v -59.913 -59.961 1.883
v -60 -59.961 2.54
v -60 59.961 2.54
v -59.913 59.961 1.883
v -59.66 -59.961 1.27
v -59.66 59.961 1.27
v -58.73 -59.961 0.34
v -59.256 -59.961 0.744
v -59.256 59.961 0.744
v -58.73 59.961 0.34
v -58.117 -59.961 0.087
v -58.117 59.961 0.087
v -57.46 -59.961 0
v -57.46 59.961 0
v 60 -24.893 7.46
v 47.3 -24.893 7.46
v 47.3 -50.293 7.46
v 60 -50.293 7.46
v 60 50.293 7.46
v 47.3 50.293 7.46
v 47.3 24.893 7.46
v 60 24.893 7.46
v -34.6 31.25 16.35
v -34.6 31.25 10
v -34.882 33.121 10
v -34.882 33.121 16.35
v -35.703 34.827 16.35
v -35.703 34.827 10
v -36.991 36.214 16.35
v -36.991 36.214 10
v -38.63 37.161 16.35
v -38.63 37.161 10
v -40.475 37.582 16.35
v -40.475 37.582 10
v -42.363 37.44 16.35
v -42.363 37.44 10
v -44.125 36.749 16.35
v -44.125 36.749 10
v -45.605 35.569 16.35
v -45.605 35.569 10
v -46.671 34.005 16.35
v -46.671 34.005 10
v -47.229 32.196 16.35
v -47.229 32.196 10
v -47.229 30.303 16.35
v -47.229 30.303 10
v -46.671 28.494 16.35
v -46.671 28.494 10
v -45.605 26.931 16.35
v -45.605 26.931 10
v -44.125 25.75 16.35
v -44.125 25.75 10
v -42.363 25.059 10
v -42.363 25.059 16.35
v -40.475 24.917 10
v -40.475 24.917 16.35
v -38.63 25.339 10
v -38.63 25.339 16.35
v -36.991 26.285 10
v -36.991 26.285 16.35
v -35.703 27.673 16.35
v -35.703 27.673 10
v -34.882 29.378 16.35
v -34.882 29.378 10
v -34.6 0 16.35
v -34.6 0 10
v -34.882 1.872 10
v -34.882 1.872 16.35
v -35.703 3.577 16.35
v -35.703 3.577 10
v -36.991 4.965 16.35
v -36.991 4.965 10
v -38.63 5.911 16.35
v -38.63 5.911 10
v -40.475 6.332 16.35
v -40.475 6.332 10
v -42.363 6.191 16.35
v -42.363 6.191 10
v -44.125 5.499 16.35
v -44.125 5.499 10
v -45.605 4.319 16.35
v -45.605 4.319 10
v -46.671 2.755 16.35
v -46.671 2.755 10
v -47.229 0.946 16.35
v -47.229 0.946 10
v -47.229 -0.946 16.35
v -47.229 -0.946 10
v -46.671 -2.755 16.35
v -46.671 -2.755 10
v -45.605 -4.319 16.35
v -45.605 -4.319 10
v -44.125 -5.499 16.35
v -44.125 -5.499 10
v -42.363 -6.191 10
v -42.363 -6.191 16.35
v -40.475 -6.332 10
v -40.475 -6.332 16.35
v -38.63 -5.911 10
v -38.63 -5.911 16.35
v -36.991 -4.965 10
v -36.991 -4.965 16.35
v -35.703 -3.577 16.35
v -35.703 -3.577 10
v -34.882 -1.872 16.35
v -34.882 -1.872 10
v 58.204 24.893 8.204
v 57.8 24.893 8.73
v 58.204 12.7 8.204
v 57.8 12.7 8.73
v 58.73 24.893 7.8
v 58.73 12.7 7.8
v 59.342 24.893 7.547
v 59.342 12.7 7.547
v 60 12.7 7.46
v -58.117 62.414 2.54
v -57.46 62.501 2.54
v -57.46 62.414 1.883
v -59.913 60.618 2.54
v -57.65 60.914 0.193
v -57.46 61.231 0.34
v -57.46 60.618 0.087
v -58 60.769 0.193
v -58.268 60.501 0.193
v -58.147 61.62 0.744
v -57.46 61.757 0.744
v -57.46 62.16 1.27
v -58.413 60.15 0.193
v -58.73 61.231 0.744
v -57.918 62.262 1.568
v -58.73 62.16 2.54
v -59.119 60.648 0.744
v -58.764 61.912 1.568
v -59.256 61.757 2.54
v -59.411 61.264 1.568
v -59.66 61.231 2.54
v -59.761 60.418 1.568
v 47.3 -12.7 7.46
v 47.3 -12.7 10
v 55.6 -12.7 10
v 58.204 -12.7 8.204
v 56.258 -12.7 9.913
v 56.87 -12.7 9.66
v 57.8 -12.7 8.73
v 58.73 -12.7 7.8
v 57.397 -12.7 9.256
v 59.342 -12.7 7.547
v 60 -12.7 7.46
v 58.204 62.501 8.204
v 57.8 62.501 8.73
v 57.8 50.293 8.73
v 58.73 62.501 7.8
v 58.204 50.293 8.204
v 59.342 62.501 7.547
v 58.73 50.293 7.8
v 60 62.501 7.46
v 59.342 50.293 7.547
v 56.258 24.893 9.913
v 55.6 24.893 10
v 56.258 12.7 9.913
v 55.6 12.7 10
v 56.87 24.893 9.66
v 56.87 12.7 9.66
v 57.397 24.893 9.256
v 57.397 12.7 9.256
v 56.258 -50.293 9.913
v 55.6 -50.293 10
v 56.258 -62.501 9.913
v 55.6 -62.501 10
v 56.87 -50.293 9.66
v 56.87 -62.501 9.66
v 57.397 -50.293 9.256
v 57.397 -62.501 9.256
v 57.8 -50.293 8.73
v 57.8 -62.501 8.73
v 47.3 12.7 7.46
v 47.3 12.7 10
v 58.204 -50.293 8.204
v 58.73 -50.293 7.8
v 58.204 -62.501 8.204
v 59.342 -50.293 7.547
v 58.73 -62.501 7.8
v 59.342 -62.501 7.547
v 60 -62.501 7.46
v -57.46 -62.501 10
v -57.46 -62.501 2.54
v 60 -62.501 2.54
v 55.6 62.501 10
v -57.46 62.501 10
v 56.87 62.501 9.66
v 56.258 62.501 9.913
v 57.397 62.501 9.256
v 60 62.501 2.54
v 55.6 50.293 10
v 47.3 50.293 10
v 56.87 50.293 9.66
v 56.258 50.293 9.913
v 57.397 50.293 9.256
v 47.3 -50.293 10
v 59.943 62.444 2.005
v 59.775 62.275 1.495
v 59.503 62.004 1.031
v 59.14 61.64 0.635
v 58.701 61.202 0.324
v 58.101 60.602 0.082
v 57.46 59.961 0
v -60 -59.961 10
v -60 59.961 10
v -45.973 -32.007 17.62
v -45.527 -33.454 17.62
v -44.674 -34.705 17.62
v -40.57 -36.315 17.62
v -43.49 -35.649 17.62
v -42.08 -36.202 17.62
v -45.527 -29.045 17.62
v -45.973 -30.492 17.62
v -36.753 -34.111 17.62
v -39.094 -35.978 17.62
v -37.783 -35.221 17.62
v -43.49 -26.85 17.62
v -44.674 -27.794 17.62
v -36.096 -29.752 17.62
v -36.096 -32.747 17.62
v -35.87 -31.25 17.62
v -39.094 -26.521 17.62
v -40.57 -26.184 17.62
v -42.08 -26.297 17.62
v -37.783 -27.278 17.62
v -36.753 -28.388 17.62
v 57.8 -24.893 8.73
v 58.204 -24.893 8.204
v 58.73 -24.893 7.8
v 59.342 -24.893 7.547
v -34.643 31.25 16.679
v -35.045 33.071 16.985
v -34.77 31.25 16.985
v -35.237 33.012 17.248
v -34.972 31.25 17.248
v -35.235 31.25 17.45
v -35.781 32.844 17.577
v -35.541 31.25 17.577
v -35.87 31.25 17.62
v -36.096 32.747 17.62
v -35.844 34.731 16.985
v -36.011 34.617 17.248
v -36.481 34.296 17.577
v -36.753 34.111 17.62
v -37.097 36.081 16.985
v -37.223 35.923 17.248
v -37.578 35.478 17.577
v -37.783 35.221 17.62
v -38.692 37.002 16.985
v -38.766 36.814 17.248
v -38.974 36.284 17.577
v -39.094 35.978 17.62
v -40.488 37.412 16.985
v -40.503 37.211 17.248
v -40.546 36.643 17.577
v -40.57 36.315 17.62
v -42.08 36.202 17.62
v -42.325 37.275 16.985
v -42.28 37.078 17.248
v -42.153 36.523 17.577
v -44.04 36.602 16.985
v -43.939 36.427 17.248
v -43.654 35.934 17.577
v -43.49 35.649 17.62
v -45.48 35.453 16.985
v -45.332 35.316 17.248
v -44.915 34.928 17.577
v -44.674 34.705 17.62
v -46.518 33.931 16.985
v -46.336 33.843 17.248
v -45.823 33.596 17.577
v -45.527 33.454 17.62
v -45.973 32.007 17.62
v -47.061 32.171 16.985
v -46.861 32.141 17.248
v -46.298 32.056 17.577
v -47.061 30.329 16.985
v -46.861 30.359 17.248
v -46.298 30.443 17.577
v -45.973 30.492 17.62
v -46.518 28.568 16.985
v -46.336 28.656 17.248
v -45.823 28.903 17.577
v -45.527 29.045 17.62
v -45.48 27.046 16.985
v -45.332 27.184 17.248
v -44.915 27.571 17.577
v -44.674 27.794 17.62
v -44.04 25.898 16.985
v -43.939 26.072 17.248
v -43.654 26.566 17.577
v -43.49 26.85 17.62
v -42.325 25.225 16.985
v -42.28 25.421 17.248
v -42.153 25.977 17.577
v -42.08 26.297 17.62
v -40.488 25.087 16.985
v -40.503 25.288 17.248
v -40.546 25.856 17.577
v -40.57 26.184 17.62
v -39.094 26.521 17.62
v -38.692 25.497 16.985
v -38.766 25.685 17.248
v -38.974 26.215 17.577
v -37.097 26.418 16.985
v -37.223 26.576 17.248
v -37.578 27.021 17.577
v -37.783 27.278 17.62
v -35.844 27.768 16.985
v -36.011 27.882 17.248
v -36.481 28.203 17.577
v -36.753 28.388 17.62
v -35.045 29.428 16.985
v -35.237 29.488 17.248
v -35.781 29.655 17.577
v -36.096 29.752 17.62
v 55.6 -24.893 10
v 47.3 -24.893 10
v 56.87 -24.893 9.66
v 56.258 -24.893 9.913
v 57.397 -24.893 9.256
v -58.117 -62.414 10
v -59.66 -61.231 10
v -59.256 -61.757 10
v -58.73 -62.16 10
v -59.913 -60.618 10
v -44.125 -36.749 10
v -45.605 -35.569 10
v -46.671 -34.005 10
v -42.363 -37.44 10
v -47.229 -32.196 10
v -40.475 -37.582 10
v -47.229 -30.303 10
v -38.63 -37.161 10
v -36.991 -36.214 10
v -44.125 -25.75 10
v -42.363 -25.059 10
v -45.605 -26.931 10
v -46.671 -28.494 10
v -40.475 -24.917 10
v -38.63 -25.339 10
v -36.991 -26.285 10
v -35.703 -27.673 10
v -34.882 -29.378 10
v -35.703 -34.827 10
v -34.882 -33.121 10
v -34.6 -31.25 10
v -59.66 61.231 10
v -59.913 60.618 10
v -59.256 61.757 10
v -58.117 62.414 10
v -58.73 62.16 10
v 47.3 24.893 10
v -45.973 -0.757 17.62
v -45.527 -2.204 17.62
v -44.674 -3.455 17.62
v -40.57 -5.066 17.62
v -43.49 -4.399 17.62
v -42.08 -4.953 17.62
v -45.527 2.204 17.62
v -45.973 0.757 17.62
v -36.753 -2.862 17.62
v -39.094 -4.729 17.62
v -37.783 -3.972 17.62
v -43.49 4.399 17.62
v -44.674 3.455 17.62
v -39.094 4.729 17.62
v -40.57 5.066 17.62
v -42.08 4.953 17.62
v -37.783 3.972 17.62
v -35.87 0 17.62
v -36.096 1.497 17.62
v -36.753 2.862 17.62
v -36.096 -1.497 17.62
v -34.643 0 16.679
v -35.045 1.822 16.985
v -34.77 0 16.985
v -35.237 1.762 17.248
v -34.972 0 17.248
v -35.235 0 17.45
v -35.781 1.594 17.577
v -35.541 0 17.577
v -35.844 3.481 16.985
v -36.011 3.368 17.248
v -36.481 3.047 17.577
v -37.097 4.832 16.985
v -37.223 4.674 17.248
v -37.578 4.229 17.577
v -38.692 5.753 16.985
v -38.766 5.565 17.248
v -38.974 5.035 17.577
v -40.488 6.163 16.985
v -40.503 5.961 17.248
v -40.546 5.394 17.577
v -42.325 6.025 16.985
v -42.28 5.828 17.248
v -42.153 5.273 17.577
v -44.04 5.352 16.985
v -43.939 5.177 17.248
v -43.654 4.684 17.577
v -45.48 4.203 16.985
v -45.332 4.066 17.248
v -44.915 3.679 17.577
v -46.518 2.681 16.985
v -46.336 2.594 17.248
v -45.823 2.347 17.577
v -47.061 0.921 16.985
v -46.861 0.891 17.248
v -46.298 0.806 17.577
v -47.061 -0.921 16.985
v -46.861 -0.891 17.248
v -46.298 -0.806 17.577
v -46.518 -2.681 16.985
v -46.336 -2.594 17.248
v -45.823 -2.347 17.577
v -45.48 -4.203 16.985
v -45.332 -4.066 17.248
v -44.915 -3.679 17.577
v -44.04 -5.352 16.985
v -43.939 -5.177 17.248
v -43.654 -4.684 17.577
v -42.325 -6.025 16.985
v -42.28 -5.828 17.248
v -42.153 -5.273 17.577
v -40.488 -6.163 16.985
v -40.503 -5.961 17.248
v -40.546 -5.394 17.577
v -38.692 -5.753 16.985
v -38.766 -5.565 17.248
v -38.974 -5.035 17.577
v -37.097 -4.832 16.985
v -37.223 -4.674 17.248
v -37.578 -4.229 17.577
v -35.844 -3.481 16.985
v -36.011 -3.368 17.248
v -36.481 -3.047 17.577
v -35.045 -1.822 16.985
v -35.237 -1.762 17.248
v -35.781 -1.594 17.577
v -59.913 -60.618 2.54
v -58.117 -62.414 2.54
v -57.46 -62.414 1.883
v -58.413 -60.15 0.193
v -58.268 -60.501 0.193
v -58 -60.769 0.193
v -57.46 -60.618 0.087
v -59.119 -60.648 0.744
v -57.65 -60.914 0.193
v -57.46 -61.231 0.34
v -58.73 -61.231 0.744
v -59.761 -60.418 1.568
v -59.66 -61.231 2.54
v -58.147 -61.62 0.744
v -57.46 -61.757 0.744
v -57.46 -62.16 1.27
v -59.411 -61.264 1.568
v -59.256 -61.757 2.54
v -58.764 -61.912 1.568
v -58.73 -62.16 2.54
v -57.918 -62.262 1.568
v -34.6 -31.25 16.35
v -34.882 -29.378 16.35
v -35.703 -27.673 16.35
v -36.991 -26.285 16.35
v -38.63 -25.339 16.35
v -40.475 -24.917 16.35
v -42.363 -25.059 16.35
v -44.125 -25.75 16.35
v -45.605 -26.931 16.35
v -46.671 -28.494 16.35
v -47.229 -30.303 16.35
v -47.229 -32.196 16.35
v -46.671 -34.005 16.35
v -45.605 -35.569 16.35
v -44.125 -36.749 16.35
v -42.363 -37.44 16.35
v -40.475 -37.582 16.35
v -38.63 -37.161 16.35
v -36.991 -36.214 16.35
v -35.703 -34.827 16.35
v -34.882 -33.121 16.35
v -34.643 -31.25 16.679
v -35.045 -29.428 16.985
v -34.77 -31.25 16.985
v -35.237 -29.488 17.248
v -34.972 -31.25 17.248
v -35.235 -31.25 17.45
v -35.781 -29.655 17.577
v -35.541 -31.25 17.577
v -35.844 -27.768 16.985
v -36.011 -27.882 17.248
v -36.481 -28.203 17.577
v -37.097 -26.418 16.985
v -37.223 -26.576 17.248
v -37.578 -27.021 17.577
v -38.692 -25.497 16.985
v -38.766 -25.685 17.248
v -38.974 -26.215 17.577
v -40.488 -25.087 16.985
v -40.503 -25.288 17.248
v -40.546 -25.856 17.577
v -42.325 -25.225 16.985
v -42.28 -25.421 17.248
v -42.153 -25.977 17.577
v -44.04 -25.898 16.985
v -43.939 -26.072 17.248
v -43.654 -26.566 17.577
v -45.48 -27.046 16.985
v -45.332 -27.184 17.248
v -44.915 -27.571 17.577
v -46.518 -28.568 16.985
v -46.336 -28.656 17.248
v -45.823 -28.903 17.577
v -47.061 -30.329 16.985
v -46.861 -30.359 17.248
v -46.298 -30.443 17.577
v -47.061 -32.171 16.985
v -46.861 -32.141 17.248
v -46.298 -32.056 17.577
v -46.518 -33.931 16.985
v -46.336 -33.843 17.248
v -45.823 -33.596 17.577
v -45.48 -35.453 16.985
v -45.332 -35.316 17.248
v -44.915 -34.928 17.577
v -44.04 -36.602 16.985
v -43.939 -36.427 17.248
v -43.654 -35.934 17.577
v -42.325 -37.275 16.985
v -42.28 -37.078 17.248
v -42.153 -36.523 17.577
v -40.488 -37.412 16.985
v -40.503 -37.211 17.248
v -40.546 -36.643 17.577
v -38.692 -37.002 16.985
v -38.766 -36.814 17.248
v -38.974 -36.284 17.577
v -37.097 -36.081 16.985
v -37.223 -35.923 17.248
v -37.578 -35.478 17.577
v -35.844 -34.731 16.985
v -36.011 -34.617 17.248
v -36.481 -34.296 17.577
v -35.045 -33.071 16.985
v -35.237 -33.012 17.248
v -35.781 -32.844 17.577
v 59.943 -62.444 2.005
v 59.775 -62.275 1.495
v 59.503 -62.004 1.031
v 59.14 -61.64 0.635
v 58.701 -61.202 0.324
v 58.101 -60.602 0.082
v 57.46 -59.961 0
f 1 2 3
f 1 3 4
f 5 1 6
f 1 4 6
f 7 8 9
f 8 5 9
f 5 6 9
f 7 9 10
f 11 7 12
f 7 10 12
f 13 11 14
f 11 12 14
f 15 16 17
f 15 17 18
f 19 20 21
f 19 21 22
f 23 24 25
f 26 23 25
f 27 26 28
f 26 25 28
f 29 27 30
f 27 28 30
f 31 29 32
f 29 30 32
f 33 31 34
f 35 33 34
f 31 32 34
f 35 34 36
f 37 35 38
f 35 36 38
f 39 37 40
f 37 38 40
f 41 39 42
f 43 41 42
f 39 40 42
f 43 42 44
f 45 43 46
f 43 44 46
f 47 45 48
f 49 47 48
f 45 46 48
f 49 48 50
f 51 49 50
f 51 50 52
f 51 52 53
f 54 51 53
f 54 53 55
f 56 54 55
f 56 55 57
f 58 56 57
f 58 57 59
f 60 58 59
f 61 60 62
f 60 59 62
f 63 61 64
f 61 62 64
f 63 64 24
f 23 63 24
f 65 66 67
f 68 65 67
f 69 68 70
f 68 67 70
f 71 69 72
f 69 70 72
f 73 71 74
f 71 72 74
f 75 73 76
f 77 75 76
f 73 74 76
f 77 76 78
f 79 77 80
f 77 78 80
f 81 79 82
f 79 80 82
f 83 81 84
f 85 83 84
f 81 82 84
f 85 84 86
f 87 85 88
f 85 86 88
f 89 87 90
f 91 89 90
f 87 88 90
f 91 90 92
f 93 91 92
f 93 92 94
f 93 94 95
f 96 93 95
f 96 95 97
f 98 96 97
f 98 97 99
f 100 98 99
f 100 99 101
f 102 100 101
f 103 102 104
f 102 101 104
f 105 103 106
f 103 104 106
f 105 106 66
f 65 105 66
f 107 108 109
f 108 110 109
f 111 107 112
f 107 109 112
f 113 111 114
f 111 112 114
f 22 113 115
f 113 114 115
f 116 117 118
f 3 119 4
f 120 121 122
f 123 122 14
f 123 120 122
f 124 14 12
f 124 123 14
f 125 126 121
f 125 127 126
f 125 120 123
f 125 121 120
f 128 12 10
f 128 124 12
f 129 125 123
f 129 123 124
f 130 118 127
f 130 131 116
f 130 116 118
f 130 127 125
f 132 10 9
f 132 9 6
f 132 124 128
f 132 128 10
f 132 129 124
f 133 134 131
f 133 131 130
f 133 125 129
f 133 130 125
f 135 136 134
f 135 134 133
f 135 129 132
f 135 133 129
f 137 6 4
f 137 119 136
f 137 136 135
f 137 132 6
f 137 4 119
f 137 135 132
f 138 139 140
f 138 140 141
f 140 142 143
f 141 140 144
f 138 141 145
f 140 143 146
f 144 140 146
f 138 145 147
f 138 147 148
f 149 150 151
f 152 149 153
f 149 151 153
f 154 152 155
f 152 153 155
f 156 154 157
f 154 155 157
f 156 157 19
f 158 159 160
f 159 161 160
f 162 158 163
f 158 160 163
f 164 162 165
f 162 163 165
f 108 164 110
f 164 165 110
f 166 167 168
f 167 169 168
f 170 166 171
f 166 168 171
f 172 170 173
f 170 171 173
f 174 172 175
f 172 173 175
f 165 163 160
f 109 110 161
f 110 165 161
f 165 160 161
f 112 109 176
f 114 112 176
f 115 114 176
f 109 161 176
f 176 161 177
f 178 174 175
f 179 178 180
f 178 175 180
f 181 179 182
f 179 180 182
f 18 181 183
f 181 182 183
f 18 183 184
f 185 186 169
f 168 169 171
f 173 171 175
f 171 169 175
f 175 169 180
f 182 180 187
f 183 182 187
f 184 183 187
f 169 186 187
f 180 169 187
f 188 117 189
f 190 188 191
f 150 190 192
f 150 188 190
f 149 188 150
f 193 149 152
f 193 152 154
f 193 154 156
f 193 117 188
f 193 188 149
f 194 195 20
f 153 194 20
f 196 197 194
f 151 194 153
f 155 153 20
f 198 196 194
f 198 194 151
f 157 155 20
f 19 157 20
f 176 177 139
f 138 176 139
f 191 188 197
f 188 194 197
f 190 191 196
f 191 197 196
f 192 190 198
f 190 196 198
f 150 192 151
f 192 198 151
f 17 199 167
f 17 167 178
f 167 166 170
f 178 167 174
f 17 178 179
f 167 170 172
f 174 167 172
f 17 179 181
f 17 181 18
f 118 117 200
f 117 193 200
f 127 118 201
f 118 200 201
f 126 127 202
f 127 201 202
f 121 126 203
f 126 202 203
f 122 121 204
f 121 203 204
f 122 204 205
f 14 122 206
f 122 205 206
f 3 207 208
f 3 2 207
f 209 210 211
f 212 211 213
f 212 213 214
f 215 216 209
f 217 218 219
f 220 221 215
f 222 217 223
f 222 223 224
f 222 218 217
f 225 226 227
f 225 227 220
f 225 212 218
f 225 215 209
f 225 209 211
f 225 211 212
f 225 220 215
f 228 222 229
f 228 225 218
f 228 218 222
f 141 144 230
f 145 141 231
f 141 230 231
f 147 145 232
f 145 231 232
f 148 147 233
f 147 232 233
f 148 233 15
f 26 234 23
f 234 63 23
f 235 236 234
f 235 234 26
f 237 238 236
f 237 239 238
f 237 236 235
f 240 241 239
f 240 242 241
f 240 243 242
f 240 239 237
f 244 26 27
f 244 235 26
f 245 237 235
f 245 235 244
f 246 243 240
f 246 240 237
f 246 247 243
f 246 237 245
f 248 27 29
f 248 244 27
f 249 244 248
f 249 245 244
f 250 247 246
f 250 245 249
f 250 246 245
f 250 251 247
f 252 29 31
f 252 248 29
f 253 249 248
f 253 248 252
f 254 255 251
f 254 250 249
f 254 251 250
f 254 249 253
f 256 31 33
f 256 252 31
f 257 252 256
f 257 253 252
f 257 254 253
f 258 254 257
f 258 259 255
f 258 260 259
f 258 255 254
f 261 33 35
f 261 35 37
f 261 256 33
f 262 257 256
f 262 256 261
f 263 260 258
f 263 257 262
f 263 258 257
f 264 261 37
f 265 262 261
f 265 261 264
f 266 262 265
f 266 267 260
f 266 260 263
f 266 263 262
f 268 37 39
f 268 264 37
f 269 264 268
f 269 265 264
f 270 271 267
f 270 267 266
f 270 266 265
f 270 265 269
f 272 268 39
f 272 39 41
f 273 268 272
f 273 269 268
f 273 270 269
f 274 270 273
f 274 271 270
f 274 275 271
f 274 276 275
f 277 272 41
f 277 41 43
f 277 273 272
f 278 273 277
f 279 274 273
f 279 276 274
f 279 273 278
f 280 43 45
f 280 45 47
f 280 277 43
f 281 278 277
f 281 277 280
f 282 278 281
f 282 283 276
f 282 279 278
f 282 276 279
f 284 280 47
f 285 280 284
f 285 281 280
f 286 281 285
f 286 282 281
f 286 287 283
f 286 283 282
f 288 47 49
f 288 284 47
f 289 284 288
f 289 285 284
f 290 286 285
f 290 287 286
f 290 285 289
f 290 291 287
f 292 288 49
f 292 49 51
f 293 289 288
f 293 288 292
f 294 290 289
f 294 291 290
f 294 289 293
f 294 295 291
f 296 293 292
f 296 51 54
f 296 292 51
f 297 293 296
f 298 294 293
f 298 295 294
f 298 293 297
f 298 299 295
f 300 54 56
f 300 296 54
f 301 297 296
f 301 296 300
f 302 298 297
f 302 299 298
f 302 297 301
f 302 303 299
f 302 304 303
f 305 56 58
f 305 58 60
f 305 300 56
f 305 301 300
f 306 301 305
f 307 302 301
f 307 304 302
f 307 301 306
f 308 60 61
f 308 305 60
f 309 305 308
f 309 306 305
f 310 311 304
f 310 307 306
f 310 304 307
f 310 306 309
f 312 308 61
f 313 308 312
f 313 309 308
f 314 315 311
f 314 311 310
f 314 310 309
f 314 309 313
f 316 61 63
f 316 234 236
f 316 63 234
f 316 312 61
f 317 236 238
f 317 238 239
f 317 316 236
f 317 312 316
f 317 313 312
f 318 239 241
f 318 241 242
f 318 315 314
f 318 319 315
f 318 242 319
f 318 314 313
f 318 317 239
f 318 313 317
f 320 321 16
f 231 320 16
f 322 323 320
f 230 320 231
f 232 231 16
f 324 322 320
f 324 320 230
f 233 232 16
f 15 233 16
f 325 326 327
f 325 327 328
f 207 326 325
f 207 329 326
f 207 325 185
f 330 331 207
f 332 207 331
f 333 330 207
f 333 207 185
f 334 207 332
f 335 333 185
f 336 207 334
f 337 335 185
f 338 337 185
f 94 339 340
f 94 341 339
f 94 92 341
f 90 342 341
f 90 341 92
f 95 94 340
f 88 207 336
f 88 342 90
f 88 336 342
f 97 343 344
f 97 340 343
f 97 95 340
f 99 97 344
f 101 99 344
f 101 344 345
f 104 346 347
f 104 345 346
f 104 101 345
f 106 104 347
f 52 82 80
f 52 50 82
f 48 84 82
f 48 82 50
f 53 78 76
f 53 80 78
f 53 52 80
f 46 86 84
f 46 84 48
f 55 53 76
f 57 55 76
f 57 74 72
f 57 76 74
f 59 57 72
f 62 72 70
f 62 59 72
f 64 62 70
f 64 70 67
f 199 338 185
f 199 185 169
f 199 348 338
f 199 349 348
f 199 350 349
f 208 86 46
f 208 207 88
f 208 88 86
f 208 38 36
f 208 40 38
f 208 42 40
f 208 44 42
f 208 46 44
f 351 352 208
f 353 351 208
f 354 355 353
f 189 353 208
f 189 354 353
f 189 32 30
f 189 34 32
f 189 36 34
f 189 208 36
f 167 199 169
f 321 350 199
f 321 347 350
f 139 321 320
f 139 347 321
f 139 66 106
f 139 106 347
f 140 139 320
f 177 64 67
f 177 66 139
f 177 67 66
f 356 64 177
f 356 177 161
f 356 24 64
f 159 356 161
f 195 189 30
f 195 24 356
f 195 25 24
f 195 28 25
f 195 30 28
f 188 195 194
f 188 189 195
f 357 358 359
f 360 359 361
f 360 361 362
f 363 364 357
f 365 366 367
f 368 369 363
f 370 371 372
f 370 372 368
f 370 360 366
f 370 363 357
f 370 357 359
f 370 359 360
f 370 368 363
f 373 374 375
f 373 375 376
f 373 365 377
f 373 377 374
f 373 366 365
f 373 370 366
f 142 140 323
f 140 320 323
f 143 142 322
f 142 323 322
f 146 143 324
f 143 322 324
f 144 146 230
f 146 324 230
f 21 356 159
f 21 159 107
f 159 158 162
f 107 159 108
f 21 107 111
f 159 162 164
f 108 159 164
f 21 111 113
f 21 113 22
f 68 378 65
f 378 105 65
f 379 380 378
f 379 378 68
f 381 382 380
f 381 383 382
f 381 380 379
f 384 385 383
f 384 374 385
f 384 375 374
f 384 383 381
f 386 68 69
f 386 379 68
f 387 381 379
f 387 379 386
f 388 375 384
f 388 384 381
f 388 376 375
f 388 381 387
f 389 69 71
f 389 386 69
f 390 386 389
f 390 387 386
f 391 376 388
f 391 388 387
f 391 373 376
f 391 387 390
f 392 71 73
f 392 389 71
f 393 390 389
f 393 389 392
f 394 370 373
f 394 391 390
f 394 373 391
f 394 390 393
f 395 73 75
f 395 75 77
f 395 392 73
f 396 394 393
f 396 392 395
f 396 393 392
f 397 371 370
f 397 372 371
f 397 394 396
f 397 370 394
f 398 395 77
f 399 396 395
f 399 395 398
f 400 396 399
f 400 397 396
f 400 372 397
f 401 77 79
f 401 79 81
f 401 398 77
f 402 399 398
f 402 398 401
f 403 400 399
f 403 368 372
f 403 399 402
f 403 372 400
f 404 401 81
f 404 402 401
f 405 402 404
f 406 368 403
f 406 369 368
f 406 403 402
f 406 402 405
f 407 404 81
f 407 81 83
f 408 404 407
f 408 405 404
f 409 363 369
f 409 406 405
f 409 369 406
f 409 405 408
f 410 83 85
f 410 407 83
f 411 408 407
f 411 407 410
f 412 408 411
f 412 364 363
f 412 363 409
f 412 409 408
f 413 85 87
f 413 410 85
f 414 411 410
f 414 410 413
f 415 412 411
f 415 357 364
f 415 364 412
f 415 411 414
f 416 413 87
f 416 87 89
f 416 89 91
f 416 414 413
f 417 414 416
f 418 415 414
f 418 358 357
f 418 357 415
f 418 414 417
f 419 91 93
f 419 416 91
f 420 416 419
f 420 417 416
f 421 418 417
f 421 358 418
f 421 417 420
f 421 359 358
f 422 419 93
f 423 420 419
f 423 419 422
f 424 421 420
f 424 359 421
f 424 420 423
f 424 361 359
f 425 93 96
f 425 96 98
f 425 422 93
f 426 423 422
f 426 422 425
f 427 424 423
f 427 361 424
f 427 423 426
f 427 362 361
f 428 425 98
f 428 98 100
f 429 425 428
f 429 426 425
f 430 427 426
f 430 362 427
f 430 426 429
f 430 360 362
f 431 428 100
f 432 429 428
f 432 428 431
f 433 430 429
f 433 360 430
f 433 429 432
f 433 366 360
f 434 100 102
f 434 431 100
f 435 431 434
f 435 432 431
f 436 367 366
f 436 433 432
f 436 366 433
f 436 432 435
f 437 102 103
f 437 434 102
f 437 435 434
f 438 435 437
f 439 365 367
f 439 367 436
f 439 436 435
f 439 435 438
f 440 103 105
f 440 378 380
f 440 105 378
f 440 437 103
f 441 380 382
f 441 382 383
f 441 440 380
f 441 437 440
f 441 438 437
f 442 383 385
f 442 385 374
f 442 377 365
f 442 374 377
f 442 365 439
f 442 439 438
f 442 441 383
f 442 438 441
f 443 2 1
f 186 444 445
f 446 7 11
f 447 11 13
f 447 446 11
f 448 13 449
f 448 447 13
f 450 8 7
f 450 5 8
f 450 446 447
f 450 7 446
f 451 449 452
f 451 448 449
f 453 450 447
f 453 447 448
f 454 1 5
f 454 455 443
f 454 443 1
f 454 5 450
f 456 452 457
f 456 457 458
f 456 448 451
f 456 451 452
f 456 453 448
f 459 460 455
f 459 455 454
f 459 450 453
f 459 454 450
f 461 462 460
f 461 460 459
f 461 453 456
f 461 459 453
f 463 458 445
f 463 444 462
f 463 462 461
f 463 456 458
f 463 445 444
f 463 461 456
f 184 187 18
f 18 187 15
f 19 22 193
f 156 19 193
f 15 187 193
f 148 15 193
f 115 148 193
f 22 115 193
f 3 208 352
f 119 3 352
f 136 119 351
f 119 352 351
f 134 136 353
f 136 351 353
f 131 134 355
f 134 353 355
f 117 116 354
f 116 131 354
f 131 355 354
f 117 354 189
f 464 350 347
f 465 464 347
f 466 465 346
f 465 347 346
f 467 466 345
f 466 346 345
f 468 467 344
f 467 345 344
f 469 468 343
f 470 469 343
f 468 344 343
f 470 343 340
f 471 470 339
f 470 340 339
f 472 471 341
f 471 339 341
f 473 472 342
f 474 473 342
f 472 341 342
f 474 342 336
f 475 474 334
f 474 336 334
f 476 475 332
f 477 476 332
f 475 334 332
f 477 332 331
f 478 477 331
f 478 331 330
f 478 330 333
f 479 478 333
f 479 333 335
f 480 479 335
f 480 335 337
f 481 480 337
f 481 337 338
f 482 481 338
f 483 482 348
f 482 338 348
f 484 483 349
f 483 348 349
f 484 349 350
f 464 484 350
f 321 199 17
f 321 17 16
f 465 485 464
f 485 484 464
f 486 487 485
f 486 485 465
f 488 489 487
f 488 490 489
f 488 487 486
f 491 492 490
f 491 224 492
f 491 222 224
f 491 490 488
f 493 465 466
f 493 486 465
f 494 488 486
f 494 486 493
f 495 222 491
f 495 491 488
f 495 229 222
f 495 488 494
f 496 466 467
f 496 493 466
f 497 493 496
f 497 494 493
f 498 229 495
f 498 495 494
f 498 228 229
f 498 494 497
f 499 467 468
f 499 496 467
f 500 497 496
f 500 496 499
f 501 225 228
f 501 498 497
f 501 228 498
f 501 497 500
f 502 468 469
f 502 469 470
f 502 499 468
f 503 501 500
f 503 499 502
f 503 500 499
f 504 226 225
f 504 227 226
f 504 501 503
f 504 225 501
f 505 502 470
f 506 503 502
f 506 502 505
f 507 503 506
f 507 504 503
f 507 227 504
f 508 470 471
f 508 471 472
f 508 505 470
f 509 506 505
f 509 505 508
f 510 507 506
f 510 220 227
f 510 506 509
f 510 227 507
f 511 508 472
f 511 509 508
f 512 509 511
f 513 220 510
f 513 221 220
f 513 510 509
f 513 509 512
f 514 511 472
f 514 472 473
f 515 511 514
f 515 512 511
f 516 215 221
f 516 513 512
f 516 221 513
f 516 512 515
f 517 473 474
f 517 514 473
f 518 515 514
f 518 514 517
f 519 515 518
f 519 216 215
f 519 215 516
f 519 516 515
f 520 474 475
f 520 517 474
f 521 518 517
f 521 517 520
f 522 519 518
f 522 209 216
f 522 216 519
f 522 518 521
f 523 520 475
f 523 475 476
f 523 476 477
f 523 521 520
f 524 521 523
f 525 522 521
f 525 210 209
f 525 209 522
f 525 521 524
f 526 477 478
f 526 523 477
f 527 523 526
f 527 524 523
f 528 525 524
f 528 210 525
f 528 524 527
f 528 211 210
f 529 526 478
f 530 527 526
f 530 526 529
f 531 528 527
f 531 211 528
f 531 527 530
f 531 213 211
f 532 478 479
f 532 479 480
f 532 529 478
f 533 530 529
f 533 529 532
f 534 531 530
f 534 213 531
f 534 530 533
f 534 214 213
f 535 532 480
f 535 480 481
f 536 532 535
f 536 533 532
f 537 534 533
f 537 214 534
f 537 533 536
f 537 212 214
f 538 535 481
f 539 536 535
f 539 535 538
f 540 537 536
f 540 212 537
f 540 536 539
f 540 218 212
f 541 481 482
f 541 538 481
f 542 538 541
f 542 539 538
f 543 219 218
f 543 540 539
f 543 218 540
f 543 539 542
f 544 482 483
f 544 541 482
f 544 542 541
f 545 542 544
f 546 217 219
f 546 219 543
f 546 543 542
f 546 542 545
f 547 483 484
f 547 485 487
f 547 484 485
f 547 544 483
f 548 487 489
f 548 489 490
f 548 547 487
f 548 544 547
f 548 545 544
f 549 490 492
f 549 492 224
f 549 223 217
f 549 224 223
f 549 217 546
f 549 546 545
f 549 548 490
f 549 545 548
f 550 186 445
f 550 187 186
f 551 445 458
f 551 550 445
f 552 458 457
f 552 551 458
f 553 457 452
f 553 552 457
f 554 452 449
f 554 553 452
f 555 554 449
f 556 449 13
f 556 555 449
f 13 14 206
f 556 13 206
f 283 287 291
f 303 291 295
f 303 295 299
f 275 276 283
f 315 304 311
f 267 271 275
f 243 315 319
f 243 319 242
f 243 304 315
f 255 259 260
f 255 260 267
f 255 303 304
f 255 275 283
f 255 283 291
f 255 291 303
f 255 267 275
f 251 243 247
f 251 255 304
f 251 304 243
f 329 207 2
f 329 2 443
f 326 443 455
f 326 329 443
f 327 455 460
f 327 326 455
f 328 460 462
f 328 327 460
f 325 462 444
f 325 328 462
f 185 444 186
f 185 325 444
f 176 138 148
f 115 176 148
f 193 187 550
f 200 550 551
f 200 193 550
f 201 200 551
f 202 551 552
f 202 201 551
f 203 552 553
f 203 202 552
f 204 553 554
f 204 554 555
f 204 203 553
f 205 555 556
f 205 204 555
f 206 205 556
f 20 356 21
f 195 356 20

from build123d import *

# Parameters (mm, degrees)
F0_W     = 119.99976
F0_H     = 125.00102
F1_DEPTH = 10
F2_W     = 12.7
F2_H     = 25.4
F3_DEPTH = 2.54
F4_R     = 6.35
F5_DEPTH = 7.62
F6_R     = 1.27
F7_R     = 2.54
F8_R     = 2.54
F9_DEPTH = 125.00202
F10_R    = 2.54


with BuildPart() as f1:
    # F0 (on Top) → F1 (new body)
    with BuildSketch(Plane.XY):
        Rectangle(F0_W, F0_H)
    extrude(amount=F1_DEPTH)

    # F2 (on face) → F3 (cut)
    with BuildSketch(Plane.XY.offset(10)):
        with Locations((53.64988, -37.59327)):
            Rectangle(F2_W, F2_H)
        Polygon((47.29988, -12.7), (59.99988, -12.7), (59.99988, 12.7), (47.29988, 12.7), (47.29988, 0), align=None)
        with Locations((53.64988, 37.59327)):
            Rectangle(F2_W, F2_H)
    extrude(amount=-F3_DEPTH, mode=Mode.SUBTRACT)

    # F4 (on face) → F5 (join)
    with BuildSketch(Plane.XY.offset(10)):
        with Locations((-40.94988, 0)):
            Circle(F4_R)
        with Locations((-40.94988, -31.24962)):
            Circle(F4_R)
        with Locations((-40.94988, 31.24962)):
            Circle(F4_R)
    extrude(amount=F5_DEPTH)

    # F6
    f6_edges = [f1.edges().sort_by_distance(p)[0] for p in [
        (-47.29988, -31.24962, 17.62),
        (-47.29988, 0, 17.62),
        (-47.29988, 31.24962, 17.62),
    ]]
    fillet(f6_edges, radius=F6_R)

    # F7
    f7_edges = [f1.edges().sort_by_distance(p)[0] for p in [
        (-59.99988, 62.50051, 5),
        (-59.99988, -62.50051, 5),
        (0, 62.50051, 0),
        (-59.99988, 0, 0),
        (0, -62.50051, 0),
        (59.99988, 0, 0),
    ]]
    fillet(f7_edges, radius=F7_R)

    # F8 (on face) → F9 (cut, through all)
    with BuildSketch(Plane.XZ.offset(62.50051)):
        with Locations((59.99988, 10)):
            Circle(F8_R)
    extrude(amount=-F9_DEPTH, mode=Mode.SUBTRACT)

    # F10
    f10_edges = [f1.edges().sort_by_distance(p)[0] for p in [
        (57.45988, 56.39689, 10),
        (57.45988, 18.796635, 10),
        (57.45988, -18.796635, 10),
        (57.45988, -56.39689, 10),
    ]]
    fillet(f10_edges, radius=F10_R)


solid = f1.part
